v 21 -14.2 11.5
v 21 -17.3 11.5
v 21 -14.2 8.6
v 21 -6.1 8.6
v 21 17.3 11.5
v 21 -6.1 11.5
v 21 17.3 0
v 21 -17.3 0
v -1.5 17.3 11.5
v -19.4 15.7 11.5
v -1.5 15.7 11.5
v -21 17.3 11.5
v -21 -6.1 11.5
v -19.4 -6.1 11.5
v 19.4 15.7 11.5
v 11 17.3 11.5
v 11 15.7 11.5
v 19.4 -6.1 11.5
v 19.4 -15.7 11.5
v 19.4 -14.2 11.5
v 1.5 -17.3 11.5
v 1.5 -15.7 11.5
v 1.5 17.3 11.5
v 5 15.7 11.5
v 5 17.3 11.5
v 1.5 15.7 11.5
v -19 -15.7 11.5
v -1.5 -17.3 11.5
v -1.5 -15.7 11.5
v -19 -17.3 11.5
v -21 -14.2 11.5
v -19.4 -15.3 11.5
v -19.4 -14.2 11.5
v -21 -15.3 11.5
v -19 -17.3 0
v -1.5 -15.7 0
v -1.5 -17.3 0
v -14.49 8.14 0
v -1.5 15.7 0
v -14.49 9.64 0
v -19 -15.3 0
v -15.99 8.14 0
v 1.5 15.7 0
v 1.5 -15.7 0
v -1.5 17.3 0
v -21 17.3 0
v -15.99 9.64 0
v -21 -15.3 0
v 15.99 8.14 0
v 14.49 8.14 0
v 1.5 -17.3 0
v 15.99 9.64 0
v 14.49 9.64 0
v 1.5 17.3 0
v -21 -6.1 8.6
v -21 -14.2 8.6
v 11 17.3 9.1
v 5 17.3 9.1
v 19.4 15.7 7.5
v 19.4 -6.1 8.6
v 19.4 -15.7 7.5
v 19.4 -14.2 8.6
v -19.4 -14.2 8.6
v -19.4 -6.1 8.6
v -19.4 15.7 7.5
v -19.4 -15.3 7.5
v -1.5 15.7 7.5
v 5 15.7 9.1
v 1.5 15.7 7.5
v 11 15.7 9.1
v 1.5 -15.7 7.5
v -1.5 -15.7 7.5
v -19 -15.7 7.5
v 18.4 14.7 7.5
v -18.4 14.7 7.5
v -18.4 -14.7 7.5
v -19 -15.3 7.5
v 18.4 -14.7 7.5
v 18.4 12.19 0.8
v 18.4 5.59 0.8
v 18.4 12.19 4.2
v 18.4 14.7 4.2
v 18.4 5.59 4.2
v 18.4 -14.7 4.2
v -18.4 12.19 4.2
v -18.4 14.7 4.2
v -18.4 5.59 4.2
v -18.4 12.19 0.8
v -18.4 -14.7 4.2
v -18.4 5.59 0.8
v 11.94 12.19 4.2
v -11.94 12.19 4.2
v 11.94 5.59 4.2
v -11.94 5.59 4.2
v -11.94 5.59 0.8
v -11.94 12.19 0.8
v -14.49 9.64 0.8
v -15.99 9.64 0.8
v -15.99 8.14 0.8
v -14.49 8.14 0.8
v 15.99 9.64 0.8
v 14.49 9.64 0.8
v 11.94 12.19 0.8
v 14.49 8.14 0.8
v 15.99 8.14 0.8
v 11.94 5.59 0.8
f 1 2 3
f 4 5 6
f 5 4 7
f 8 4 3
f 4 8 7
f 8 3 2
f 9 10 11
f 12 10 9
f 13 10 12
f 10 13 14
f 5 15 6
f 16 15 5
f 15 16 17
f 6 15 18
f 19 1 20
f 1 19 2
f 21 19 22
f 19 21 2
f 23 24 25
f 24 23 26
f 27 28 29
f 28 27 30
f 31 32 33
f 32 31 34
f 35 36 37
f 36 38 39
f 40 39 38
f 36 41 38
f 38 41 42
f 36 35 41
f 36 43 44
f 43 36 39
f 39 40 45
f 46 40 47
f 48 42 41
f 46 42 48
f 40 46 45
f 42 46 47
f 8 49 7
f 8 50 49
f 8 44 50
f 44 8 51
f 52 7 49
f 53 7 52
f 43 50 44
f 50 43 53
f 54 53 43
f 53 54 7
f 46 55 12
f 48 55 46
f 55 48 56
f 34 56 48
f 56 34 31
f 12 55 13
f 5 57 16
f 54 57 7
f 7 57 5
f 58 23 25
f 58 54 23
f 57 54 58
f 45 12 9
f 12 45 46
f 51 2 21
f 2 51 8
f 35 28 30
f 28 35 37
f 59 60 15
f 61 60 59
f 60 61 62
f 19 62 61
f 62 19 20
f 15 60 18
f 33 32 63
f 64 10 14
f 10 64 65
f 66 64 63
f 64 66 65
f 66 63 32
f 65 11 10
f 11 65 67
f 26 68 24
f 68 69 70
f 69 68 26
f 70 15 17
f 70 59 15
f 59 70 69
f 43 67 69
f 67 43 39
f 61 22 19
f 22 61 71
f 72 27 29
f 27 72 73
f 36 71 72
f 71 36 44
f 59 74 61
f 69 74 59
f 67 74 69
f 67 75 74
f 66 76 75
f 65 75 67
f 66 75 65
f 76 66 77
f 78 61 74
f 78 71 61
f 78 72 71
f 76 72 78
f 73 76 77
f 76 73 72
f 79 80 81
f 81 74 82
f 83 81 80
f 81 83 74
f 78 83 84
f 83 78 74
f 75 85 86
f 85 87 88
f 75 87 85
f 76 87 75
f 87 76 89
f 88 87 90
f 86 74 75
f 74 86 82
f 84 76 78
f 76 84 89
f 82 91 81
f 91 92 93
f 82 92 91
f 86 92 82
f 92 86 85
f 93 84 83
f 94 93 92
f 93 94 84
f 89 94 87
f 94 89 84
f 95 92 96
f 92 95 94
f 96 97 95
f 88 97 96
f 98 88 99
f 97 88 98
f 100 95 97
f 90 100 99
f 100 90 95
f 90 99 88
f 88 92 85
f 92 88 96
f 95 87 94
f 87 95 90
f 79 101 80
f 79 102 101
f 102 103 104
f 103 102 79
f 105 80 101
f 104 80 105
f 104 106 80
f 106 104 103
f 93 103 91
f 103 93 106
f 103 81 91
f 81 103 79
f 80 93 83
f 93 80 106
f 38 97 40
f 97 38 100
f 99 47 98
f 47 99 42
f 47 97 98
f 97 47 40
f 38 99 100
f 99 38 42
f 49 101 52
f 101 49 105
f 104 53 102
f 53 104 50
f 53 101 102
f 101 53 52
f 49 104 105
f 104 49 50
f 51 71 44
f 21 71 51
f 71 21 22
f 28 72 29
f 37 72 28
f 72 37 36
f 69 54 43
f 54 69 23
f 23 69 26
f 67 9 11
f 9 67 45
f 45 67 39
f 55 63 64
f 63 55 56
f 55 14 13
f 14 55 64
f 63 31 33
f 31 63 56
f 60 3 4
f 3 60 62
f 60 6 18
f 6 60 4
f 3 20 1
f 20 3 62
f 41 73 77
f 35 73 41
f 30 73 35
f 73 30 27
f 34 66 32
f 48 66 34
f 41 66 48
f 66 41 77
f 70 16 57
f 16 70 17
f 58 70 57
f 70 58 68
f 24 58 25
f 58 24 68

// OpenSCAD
// Canon A-1 shutter-tester sensor plate — parametric OpenSCAD version
// Same geometry as sensor_plate.py / the STL files.
// Print FRONT FACE DOWN (pinholes on the bed) in black filament.
// Seen from above while printing = seen from the back of the camera: A is left.

bay     = true;  // true: open-top bay on the back for the comparator perfboard
W       = 42.0;  // 36 mm gate + 3 mm each side (keeps clear of the sprocket)
H       = 34.6;  // must drop between the outer film rails; try 34.0 if it binds
T       = 4.2;   // plate thickness
front   = 0.8;   // wall in front of the photodiode
spacing = 30.0;  // sensor A to B, centre to centre
pocket  = 5.8;   // square pocket, BPW34 body 5.4 x 4.3 x 3.2 fits either way round
pin     = 1.0;   // pinhole side (square; 50 % threshold makes shape uncritical)
band_w  = 3.0;   // rubber-band notch width
band_d  = 1.5;   // rubber-band notch depth (plate only; with the bay it cuts the whole wall)
mark    = 2.0;   // corner notch marking channel A (bottom-left, back view)
// bay
wall    = 1.6;
ledge   = 1.0;
ledge_z = 7.5;   // underside of the perfboard
wall_z  = 11.5;  // top of the walls
board_t = 1.6;
cable_x = [5.0, 11.0];
trim_slot = [-14.2, -6.1];  // openings in the left/right walls: 3006P body end + screw pass through (perfboard rows 10-11)
trim_floor = 8.6;  // bottom of the trimmer openings, 0.5 mm below the board top
// bay version: photodiodes soldered flat on the perfboard copper side (legs B2/B4, N2/N4)
diode_x = 15.24;   // column B / N
diode_y = 8.89;    // row 3
pin_bay = 1.5;     // pinhole side; keep <= half the 1/1000 slit (~3 mm)
pocket_bay = 6.6;  // pocket under each diode, floor thinned to `front`

e = 0.01;
nd = bay ? wall : band_d;
slot_top = bay ? H/2 - wall - ledge : H/2 + e;

difference() {
    union() {
        translate([-W/2, -H/2, 0]) cube([W, H, T]);
        if (bay) {
            // walls
            difference() {
                translate([-W/2, -H/2, 0]) cube([W, H, wall_z]);
                translate([-W/2 + wall, -H/2 + wall, -e]) cube([W - 2*wall, H - 2*wall, wall_z + 2*e]);
            }
            // ledge
            difference() {
                translate([-W/2 + wall, -H/2 + wall, 0]) cube([W - 2*wall, H - 2*wall, ledge_z]);
                translate([-W/2 + wall + ledge, -H/2 + wall + ledge, -e]) cube([W - 2*(wall+ledge), H - 2*(wall+ledge), ledge_z + 2*e]);
            }
        }
    }
    if (bay) {
        for (c = [-diode_x, diode_x]) {
            // pocket under the board-mounted diode (the ledge/walls stay solid)
            intersection() {
                translate([c - pocket_bay/2, diode_y - pocket_bay/2, front]) cube([pocket_bay, pocket_bay, T]);
                translate([-W/2 + wall + ledge, -H/2 + wall + ledge, -1]) cube([W - 2*(wall+ledge), H - 2*(wall+ledge), T + 2]);
            }
            // pinhole through the front wall, centred under the diode
            translate([c - pin_bay/2, diode_y - pin_bay/2, -e]) cube([pin_bay, pin_bay, front + 2*e]);
        }
    } else {
        for (c = [-spacing/2, spacing/2]) {
            // pocket + lead slot
            translate([c - pocket/2, -pocket/2, front]) cube([pocket, slot_top + pocket/2, T]);
            // pinhole through the front wall
            translate([c - pin/2, -pin/2, -e]) cube([pin, pin, front + 2*e]);
        }
    }
    // rubber-band notches, top and bottom centre
    for (s = [-1, 1]) translate([-band_w/2, s > 0 ? H/2 - nd : -H/2 - e, -e]) cube([band_w, nd + e, wall_z + 2*e]);
    // channel-A marker
    translate([-W/2 - e, -H/2 - e, -e]) cube([mark + e, mark + e, wall_z + 2*e]);
    // wire exit in the top wall, down to board top
    if (bay) translate([cable_x[0], H/2 - wall - e, ledge_z + board_t]) cube([cable_x[1] - cable_x[0], wall + 2*e, wall_z]);
    // trimmer openings in the left and right walls
    if (bay) for (sx = [-W/2 - e, W/2 - wall - e])
        translate([sx, trim_slot[0], trim_floor]) cube([wall + 2*e, trim_slot[1] - trim_slot[0], wall_z]);
}
